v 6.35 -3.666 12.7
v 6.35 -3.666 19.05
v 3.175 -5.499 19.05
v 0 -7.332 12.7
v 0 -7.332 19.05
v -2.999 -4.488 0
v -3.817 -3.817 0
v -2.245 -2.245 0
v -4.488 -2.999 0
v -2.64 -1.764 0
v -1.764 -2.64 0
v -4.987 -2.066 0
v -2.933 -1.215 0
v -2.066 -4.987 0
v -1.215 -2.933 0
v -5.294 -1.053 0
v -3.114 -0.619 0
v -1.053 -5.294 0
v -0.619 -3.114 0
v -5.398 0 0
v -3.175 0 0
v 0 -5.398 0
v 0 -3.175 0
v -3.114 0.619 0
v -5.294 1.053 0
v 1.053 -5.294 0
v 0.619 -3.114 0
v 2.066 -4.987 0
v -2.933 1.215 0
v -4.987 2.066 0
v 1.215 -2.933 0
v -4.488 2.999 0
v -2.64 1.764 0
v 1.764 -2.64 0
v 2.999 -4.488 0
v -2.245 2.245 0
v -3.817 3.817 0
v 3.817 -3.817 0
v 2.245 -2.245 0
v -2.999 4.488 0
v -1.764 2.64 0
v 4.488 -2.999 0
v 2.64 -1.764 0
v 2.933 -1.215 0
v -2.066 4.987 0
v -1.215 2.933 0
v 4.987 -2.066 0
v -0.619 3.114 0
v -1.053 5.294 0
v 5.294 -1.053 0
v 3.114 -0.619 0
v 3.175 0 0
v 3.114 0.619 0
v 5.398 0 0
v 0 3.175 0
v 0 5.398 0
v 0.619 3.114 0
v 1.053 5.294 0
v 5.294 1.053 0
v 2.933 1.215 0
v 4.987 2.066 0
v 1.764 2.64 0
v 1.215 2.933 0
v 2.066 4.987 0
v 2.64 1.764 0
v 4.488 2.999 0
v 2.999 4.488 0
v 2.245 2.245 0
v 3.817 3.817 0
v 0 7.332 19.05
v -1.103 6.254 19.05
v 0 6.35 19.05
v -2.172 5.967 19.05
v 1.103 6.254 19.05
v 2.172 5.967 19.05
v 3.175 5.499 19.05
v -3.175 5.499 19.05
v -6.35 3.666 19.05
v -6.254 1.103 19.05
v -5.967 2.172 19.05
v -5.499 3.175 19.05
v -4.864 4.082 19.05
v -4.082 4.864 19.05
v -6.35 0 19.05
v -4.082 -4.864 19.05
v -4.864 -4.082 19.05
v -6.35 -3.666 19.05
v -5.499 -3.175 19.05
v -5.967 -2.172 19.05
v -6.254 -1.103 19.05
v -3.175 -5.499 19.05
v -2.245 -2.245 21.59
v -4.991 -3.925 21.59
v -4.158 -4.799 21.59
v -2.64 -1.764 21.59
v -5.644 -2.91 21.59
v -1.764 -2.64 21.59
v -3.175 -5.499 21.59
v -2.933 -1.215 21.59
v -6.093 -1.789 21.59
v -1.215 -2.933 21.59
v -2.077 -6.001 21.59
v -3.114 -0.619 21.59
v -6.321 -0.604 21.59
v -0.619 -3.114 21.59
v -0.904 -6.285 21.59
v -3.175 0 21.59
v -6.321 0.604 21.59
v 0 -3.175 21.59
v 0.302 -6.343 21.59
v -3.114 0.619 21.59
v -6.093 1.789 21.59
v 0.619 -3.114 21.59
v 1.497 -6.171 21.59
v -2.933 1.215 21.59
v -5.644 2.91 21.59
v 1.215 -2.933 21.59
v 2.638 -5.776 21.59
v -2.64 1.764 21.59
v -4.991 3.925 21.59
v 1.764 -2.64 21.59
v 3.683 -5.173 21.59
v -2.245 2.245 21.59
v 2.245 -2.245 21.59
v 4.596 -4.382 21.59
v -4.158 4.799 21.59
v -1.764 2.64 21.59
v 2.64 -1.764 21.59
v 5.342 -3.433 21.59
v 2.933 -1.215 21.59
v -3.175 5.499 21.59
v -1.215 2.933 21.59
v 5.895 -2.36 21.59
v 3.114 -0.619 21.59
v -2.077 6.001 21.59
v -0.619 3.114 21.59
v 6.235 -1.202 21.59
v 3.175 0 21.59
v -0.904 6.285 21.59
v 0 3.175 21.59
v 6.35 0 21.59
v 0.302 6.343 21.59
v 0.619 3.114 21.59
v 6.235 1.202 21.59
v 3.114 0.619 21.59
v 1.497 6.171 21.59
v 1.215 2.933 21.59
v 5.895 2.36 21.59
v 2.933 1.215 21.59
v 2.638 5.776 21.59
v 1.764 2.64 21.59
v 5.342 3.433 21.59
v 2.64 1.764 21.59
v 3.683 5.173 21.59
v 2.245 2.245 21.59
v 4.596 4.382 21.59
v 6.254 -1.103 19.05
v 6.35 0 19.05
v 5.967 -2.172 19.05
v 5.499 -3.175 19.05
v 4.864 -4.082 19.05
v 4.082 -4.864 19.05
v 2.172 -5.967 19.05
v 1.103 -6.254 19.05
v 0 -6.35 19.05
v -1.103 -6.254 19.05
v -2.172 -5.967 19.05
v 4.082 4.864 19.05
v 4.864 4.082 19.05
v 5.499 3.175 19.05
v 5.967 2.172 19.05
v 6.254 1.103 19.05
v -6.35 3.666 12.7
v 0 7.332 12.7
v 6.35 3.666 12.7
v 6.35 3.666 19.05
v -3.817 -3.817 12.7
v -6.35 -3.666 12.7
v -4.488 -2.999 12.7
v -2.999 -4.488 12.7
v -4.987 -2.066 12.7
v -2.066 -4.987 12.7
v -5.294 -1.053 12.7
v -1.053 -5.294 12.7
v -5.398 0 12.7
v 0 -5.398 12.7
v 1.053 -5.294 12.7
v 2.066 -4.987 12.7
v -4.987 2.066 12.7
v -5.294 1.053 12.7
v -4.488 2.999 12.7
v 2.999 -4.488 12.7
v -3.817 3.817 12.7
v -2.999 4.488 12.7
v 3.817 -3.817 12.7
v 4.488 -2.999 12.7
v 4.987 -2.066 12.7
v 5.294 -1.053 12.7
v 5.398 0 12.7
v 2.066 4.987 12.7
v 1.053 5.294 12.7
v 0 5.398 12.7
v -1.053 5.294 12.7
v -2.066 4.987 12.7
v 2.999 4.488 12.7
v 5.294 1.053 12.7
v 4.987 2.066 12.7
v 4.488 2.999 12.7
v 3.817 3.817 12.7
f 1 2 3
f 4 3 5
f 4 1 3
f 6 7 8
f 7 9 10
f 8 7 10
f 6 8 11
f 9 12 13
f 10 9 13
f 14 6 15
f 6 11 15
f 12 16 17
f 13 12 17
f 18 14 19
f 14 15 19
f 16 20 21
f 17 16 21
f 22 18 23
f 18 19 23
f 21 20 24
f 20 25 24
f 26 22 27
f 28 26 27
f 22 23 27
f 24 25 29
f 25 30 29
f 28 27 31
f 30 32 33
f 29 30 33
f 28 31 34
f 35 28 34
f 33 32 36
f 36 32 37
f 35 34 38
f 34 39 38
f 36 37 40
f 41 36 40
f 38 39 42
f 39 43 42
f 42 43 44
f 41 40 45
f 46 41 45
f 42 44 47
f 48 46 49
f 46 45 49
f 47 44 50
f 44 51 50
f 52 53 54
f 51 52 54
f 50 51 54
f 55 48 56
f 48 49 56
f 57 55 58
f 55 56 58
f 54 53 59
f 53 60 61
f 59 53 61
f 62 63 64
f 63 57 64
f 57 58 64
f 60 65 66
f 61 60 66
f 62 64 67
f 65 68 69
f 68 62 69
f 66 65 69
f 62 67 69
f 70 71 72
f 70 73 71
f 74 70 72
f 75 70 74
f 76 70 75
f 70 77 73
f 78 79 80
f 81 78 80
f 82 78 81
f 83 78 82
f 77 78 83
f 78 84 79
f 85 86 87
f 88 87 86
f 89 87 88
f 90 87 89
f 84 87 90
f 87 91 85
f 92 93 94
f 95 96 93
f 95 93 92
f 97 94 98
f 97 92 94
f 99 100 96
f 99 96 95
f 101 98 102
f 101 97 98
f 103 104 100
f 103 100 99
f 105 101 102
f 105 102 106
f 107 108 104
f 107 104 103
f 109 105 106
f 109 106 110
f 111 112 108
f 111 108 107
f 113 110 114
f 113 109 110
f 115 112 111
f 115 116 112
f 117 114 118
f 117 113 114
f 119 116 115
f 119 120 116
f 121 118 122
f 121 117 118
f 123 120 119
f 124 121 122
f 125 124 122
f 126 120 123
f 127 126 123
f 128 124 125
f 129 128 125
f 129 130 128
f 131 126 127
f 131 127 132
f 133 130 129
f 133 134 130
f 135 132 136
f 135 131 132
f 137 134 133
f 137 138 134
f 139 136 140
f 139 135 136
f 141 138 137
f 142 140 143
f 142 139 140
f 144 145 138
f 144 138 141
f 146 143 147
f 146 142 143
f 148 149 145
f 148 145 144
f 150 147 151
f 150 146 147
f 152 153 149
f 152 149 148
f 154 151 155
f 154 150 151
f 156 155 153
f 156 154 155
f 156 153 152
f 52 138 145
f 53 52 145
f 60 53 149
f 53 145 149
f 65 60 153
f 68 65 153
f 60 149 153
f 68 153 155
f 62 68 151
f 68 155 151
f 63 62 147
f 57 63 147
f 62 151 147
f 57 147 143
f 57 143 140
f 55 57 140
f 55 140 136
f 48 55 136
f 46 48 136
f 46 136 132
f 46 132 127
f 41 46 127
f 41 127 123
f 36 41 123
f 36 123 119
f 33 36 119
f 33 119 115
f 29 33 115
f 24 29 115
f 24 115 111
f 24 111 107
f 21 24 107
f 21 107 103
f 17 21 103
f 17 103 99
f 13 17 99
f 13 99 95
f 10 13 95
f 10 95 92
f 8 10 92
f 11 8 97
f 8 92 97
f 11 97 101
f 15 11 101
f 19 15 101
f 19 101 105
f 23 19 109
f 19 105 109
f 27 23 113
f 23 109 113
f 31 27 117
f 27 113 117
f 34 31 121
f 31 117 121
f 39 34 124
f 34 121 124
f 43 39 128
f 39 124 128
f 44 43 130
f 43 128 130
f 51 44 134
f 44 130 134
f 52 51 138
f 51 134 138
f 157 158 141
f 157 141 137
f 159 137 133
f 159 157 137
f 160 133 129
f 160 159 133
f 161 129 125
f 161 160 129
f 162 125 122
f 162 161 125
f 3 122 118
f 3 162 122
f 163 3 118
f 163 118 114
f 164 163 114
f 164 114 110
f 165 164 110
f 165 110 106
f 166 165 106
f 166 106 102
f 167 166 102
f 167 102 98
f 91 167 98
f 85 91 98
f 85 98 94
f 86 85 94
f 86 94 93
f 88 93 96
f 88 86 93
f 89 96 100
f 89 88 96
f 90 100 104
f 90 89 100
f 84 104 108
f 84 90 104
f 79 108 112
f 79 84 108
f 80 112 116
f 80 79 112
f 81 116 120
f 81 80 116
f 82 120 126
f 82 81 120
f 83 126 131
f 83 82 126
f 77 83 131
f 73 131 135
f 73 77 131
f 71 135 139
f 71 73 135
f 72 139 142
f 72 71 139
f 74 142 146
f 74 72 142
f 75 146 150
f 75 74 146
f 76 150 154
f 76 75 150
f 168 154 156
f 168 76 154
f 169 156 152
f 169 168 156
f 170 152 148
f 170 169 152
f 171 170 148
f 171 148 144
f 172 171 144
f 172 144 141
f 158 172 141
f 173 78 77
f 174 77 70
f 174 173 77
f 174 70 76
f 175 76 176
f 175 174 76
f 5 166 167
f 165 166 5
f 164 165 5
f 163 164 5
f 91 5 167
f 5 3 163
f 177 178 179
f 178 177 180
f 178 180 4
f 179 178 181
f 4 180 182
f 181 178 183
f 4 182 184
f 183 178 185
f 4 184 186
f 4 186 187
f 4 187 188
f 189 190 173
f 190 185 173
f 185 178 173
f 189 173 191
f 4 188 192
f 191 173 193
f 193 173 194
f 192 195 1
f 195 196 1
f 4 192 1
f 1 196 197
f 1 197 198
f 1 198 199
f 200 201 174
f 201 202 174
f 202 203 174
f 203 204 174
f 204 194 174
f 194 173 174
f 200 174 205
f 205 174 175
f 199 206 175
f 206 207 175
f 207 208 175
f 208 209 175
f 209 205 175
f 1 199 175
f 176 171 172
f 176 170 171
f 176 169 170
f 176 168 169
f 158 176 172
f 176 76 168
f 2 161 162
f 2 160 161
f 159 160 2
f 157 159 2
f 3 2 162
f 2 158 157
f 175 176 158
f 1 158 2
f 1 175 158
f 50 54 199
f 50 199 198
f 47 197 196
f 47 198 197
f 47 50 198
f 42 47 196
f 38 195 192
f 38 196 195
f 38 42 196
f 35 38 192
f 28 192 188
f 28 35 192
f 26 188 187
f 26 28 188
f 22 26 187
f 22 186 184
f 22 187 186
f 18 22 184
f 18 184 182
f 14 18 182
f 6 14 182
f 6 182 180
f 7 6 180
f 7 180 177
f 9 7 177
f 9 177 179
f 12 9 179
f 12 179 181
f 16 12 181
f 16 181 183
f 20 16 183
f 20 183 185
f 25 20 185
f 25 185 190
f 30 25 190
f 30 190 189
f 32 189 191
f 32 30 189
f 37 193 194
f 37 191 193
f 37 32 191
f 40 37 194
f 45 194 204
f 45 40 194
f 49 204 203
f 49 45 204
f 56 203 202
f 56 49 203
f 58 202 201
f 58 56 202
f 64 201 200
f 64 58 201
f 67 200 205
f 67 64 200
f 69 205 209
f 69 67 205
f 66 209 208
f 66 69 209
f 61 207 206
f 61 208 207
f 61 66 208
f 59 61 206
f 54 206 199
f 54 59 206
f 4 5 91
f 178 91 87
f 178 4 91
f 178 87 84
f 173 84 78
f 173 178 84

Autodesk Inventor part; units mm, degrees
ref_plane "YZ Plane" through (0, 0, 0) normal (1, 0, 0) x (0, 1, 0)
ref_plane "XZ Plane" through (0, 0, 0) normal (0, 1, 0) x (-1, 0, 0)
ref_plane "XY Plane" through (0, 0, 0) normal (0, 0, 1) x (1, 0, 0)
sketch "Sketch1" plane through (0, 0, 0) normal (0, 0, 1) x (1, 0, 0)
  circle A0 centre (0, 0) radius 5.3975
  dimension "d0" = 10.795
extrude "Extrusion1" add sketch "Sketch1" along normal blind 12.7
thread "Thread1" size "7/16-14 UNC" class "2A" standard "ANSI Unified Screw Threads" full length
sketch "Sketch2" plane through (0, 0, 12.7) normal (0, 0, 1) x (1, 0, 0)
  circle A0 centre (0, 0) radius 5.3975 projected
  line L0 (0, 7.3323) -> (6.35, 3.6662)
  line L1 (6.35, 3.6662) -> (6.35, -3.6662)
  line L2 (6.35, -3.6662) -> (0, -7.3323)
  line L3 (0, -7.3323) -> (-6.35, -3.6662)
  line L4 (-6.35, -3.6662) -> (-6.35, 3.6662)
  line L5 (-6.35, 3.6662) -> (0, 7.3323)
  dimension "d5" = 12.7
  dimension "d6" = 0
extrude "Extrusion2" add sketch "Sketch2" along normal blind 6.35 contours A0 | L0 L1 L2 L3 L4 L5
sketch "Sketch3" plane through (0, 0, 19.05) normal (0, 0, 1) x (1, 0, 0)
  line L0 (0, 7.3323) -> (6.35, 3.6662) projected
  circle A0 centre (0, 0) radius 6.35
extrude "Extrusion3" add sketch "Sketch3" along normal blind 2.54
sketch "Sketch4" plane through (0, 0, 21.59) normal (0, 0, 1) x (1, 0, 0)
  circle A0 centre (0, 0) radius 6.35 projected
  circle A1 centre (0, 0) radius 3.175
  dimension "d11" = 6.35
extrude "Extrusion4" cut sketch "Sketch4" against normal through all contours A1
properties part number "Pnewmatic Screw Part 1 1764"
